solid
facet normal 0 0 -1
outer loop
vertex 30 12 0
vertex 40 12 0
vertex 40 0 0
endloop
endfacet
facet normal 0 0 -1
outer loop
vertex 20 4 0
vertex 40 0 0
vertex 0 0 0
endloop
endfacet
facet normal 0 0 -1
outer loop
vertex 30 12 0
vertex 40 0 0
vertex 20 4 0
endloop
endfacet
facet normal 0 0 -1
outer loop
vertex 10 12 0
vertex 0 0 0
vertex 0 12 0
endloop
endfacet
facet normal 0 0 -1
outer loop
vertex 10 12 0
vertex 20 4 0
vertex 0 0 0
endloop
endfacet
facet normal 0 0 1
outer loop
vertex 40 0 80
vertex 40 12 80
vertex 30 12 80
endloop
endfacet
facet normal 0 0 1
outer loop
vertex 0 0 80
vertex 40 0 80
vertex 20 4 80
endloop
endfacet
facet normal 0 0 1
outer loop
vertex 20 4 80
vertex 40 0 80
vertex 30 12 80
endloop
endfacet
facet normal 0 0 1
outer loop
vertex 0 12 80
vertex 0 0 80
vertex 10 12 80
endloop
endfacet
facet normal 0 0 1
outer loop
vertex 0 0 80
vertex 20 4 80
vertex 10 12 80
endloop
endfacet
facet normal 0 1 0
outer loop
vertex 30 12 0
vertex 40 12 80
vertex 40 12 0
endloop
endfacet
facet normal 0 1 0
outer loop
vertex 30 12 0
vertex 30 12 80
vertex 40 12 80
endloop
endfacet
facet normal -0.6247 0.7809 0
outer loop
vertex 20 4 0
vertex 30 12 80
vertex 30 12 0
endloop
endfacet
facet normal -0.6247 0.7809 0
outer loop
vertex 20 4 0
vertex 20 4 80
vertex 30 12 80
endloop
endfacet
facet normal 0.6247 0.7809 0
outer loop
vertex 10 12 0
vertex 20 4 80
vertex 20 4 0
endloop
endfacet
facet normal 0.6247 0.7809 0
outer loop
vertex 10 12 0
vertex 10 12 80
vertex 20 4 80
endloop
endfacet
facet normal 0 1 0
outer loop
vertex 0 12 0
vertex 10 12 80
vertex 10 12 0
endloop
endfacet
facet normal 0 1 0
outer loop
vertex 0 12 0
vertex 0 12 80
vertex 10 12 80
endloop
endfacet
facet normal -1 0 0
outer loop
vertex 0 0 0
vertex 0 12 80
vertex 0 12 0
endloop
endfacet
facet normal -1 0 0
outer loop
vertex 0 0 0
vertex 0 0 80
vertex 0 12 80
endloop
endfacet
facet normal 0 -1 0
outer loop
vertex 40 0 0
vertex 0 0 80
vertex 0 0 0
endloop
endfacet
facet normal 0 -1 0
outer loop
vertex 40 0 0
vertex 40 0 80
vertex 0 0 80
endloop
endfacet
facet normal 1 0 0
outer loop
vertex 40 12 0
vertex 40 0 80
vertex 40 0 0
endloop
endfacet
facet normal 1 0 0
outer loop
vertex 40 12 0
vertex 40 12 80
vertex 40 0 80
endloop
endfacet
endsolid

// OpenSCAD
$fn = 32;

// ----------------------------------------------------------------------
// V guide rail: vway, 40 mm wide
// ----------------------------------------------------------------------

// --- parameters (mm) ---
rail_w = 40;              // rail width, X
base_t = 12;              // base plate thickness
v_depth = 8;              // V feature depth / height
v_half_w = 10;            // half width of the V at the base face
plate_t = 80;             // rail length, Z (the extrusion height)
fit_tol = 0.02;           // declared fit tolerance (prompt contract)
free_tol = 0.2;           // declared free tolerance (prompt contract)

profile = [[0, 0], [40, 0], [40, 12], [30, 12], [20, 4], [10, 12], [0, 12]];  // primary outline, 7 points, counter clockwise

// --- the one profile operation ---
linear_extrude(height = plate_t) polygon(points = profile);
